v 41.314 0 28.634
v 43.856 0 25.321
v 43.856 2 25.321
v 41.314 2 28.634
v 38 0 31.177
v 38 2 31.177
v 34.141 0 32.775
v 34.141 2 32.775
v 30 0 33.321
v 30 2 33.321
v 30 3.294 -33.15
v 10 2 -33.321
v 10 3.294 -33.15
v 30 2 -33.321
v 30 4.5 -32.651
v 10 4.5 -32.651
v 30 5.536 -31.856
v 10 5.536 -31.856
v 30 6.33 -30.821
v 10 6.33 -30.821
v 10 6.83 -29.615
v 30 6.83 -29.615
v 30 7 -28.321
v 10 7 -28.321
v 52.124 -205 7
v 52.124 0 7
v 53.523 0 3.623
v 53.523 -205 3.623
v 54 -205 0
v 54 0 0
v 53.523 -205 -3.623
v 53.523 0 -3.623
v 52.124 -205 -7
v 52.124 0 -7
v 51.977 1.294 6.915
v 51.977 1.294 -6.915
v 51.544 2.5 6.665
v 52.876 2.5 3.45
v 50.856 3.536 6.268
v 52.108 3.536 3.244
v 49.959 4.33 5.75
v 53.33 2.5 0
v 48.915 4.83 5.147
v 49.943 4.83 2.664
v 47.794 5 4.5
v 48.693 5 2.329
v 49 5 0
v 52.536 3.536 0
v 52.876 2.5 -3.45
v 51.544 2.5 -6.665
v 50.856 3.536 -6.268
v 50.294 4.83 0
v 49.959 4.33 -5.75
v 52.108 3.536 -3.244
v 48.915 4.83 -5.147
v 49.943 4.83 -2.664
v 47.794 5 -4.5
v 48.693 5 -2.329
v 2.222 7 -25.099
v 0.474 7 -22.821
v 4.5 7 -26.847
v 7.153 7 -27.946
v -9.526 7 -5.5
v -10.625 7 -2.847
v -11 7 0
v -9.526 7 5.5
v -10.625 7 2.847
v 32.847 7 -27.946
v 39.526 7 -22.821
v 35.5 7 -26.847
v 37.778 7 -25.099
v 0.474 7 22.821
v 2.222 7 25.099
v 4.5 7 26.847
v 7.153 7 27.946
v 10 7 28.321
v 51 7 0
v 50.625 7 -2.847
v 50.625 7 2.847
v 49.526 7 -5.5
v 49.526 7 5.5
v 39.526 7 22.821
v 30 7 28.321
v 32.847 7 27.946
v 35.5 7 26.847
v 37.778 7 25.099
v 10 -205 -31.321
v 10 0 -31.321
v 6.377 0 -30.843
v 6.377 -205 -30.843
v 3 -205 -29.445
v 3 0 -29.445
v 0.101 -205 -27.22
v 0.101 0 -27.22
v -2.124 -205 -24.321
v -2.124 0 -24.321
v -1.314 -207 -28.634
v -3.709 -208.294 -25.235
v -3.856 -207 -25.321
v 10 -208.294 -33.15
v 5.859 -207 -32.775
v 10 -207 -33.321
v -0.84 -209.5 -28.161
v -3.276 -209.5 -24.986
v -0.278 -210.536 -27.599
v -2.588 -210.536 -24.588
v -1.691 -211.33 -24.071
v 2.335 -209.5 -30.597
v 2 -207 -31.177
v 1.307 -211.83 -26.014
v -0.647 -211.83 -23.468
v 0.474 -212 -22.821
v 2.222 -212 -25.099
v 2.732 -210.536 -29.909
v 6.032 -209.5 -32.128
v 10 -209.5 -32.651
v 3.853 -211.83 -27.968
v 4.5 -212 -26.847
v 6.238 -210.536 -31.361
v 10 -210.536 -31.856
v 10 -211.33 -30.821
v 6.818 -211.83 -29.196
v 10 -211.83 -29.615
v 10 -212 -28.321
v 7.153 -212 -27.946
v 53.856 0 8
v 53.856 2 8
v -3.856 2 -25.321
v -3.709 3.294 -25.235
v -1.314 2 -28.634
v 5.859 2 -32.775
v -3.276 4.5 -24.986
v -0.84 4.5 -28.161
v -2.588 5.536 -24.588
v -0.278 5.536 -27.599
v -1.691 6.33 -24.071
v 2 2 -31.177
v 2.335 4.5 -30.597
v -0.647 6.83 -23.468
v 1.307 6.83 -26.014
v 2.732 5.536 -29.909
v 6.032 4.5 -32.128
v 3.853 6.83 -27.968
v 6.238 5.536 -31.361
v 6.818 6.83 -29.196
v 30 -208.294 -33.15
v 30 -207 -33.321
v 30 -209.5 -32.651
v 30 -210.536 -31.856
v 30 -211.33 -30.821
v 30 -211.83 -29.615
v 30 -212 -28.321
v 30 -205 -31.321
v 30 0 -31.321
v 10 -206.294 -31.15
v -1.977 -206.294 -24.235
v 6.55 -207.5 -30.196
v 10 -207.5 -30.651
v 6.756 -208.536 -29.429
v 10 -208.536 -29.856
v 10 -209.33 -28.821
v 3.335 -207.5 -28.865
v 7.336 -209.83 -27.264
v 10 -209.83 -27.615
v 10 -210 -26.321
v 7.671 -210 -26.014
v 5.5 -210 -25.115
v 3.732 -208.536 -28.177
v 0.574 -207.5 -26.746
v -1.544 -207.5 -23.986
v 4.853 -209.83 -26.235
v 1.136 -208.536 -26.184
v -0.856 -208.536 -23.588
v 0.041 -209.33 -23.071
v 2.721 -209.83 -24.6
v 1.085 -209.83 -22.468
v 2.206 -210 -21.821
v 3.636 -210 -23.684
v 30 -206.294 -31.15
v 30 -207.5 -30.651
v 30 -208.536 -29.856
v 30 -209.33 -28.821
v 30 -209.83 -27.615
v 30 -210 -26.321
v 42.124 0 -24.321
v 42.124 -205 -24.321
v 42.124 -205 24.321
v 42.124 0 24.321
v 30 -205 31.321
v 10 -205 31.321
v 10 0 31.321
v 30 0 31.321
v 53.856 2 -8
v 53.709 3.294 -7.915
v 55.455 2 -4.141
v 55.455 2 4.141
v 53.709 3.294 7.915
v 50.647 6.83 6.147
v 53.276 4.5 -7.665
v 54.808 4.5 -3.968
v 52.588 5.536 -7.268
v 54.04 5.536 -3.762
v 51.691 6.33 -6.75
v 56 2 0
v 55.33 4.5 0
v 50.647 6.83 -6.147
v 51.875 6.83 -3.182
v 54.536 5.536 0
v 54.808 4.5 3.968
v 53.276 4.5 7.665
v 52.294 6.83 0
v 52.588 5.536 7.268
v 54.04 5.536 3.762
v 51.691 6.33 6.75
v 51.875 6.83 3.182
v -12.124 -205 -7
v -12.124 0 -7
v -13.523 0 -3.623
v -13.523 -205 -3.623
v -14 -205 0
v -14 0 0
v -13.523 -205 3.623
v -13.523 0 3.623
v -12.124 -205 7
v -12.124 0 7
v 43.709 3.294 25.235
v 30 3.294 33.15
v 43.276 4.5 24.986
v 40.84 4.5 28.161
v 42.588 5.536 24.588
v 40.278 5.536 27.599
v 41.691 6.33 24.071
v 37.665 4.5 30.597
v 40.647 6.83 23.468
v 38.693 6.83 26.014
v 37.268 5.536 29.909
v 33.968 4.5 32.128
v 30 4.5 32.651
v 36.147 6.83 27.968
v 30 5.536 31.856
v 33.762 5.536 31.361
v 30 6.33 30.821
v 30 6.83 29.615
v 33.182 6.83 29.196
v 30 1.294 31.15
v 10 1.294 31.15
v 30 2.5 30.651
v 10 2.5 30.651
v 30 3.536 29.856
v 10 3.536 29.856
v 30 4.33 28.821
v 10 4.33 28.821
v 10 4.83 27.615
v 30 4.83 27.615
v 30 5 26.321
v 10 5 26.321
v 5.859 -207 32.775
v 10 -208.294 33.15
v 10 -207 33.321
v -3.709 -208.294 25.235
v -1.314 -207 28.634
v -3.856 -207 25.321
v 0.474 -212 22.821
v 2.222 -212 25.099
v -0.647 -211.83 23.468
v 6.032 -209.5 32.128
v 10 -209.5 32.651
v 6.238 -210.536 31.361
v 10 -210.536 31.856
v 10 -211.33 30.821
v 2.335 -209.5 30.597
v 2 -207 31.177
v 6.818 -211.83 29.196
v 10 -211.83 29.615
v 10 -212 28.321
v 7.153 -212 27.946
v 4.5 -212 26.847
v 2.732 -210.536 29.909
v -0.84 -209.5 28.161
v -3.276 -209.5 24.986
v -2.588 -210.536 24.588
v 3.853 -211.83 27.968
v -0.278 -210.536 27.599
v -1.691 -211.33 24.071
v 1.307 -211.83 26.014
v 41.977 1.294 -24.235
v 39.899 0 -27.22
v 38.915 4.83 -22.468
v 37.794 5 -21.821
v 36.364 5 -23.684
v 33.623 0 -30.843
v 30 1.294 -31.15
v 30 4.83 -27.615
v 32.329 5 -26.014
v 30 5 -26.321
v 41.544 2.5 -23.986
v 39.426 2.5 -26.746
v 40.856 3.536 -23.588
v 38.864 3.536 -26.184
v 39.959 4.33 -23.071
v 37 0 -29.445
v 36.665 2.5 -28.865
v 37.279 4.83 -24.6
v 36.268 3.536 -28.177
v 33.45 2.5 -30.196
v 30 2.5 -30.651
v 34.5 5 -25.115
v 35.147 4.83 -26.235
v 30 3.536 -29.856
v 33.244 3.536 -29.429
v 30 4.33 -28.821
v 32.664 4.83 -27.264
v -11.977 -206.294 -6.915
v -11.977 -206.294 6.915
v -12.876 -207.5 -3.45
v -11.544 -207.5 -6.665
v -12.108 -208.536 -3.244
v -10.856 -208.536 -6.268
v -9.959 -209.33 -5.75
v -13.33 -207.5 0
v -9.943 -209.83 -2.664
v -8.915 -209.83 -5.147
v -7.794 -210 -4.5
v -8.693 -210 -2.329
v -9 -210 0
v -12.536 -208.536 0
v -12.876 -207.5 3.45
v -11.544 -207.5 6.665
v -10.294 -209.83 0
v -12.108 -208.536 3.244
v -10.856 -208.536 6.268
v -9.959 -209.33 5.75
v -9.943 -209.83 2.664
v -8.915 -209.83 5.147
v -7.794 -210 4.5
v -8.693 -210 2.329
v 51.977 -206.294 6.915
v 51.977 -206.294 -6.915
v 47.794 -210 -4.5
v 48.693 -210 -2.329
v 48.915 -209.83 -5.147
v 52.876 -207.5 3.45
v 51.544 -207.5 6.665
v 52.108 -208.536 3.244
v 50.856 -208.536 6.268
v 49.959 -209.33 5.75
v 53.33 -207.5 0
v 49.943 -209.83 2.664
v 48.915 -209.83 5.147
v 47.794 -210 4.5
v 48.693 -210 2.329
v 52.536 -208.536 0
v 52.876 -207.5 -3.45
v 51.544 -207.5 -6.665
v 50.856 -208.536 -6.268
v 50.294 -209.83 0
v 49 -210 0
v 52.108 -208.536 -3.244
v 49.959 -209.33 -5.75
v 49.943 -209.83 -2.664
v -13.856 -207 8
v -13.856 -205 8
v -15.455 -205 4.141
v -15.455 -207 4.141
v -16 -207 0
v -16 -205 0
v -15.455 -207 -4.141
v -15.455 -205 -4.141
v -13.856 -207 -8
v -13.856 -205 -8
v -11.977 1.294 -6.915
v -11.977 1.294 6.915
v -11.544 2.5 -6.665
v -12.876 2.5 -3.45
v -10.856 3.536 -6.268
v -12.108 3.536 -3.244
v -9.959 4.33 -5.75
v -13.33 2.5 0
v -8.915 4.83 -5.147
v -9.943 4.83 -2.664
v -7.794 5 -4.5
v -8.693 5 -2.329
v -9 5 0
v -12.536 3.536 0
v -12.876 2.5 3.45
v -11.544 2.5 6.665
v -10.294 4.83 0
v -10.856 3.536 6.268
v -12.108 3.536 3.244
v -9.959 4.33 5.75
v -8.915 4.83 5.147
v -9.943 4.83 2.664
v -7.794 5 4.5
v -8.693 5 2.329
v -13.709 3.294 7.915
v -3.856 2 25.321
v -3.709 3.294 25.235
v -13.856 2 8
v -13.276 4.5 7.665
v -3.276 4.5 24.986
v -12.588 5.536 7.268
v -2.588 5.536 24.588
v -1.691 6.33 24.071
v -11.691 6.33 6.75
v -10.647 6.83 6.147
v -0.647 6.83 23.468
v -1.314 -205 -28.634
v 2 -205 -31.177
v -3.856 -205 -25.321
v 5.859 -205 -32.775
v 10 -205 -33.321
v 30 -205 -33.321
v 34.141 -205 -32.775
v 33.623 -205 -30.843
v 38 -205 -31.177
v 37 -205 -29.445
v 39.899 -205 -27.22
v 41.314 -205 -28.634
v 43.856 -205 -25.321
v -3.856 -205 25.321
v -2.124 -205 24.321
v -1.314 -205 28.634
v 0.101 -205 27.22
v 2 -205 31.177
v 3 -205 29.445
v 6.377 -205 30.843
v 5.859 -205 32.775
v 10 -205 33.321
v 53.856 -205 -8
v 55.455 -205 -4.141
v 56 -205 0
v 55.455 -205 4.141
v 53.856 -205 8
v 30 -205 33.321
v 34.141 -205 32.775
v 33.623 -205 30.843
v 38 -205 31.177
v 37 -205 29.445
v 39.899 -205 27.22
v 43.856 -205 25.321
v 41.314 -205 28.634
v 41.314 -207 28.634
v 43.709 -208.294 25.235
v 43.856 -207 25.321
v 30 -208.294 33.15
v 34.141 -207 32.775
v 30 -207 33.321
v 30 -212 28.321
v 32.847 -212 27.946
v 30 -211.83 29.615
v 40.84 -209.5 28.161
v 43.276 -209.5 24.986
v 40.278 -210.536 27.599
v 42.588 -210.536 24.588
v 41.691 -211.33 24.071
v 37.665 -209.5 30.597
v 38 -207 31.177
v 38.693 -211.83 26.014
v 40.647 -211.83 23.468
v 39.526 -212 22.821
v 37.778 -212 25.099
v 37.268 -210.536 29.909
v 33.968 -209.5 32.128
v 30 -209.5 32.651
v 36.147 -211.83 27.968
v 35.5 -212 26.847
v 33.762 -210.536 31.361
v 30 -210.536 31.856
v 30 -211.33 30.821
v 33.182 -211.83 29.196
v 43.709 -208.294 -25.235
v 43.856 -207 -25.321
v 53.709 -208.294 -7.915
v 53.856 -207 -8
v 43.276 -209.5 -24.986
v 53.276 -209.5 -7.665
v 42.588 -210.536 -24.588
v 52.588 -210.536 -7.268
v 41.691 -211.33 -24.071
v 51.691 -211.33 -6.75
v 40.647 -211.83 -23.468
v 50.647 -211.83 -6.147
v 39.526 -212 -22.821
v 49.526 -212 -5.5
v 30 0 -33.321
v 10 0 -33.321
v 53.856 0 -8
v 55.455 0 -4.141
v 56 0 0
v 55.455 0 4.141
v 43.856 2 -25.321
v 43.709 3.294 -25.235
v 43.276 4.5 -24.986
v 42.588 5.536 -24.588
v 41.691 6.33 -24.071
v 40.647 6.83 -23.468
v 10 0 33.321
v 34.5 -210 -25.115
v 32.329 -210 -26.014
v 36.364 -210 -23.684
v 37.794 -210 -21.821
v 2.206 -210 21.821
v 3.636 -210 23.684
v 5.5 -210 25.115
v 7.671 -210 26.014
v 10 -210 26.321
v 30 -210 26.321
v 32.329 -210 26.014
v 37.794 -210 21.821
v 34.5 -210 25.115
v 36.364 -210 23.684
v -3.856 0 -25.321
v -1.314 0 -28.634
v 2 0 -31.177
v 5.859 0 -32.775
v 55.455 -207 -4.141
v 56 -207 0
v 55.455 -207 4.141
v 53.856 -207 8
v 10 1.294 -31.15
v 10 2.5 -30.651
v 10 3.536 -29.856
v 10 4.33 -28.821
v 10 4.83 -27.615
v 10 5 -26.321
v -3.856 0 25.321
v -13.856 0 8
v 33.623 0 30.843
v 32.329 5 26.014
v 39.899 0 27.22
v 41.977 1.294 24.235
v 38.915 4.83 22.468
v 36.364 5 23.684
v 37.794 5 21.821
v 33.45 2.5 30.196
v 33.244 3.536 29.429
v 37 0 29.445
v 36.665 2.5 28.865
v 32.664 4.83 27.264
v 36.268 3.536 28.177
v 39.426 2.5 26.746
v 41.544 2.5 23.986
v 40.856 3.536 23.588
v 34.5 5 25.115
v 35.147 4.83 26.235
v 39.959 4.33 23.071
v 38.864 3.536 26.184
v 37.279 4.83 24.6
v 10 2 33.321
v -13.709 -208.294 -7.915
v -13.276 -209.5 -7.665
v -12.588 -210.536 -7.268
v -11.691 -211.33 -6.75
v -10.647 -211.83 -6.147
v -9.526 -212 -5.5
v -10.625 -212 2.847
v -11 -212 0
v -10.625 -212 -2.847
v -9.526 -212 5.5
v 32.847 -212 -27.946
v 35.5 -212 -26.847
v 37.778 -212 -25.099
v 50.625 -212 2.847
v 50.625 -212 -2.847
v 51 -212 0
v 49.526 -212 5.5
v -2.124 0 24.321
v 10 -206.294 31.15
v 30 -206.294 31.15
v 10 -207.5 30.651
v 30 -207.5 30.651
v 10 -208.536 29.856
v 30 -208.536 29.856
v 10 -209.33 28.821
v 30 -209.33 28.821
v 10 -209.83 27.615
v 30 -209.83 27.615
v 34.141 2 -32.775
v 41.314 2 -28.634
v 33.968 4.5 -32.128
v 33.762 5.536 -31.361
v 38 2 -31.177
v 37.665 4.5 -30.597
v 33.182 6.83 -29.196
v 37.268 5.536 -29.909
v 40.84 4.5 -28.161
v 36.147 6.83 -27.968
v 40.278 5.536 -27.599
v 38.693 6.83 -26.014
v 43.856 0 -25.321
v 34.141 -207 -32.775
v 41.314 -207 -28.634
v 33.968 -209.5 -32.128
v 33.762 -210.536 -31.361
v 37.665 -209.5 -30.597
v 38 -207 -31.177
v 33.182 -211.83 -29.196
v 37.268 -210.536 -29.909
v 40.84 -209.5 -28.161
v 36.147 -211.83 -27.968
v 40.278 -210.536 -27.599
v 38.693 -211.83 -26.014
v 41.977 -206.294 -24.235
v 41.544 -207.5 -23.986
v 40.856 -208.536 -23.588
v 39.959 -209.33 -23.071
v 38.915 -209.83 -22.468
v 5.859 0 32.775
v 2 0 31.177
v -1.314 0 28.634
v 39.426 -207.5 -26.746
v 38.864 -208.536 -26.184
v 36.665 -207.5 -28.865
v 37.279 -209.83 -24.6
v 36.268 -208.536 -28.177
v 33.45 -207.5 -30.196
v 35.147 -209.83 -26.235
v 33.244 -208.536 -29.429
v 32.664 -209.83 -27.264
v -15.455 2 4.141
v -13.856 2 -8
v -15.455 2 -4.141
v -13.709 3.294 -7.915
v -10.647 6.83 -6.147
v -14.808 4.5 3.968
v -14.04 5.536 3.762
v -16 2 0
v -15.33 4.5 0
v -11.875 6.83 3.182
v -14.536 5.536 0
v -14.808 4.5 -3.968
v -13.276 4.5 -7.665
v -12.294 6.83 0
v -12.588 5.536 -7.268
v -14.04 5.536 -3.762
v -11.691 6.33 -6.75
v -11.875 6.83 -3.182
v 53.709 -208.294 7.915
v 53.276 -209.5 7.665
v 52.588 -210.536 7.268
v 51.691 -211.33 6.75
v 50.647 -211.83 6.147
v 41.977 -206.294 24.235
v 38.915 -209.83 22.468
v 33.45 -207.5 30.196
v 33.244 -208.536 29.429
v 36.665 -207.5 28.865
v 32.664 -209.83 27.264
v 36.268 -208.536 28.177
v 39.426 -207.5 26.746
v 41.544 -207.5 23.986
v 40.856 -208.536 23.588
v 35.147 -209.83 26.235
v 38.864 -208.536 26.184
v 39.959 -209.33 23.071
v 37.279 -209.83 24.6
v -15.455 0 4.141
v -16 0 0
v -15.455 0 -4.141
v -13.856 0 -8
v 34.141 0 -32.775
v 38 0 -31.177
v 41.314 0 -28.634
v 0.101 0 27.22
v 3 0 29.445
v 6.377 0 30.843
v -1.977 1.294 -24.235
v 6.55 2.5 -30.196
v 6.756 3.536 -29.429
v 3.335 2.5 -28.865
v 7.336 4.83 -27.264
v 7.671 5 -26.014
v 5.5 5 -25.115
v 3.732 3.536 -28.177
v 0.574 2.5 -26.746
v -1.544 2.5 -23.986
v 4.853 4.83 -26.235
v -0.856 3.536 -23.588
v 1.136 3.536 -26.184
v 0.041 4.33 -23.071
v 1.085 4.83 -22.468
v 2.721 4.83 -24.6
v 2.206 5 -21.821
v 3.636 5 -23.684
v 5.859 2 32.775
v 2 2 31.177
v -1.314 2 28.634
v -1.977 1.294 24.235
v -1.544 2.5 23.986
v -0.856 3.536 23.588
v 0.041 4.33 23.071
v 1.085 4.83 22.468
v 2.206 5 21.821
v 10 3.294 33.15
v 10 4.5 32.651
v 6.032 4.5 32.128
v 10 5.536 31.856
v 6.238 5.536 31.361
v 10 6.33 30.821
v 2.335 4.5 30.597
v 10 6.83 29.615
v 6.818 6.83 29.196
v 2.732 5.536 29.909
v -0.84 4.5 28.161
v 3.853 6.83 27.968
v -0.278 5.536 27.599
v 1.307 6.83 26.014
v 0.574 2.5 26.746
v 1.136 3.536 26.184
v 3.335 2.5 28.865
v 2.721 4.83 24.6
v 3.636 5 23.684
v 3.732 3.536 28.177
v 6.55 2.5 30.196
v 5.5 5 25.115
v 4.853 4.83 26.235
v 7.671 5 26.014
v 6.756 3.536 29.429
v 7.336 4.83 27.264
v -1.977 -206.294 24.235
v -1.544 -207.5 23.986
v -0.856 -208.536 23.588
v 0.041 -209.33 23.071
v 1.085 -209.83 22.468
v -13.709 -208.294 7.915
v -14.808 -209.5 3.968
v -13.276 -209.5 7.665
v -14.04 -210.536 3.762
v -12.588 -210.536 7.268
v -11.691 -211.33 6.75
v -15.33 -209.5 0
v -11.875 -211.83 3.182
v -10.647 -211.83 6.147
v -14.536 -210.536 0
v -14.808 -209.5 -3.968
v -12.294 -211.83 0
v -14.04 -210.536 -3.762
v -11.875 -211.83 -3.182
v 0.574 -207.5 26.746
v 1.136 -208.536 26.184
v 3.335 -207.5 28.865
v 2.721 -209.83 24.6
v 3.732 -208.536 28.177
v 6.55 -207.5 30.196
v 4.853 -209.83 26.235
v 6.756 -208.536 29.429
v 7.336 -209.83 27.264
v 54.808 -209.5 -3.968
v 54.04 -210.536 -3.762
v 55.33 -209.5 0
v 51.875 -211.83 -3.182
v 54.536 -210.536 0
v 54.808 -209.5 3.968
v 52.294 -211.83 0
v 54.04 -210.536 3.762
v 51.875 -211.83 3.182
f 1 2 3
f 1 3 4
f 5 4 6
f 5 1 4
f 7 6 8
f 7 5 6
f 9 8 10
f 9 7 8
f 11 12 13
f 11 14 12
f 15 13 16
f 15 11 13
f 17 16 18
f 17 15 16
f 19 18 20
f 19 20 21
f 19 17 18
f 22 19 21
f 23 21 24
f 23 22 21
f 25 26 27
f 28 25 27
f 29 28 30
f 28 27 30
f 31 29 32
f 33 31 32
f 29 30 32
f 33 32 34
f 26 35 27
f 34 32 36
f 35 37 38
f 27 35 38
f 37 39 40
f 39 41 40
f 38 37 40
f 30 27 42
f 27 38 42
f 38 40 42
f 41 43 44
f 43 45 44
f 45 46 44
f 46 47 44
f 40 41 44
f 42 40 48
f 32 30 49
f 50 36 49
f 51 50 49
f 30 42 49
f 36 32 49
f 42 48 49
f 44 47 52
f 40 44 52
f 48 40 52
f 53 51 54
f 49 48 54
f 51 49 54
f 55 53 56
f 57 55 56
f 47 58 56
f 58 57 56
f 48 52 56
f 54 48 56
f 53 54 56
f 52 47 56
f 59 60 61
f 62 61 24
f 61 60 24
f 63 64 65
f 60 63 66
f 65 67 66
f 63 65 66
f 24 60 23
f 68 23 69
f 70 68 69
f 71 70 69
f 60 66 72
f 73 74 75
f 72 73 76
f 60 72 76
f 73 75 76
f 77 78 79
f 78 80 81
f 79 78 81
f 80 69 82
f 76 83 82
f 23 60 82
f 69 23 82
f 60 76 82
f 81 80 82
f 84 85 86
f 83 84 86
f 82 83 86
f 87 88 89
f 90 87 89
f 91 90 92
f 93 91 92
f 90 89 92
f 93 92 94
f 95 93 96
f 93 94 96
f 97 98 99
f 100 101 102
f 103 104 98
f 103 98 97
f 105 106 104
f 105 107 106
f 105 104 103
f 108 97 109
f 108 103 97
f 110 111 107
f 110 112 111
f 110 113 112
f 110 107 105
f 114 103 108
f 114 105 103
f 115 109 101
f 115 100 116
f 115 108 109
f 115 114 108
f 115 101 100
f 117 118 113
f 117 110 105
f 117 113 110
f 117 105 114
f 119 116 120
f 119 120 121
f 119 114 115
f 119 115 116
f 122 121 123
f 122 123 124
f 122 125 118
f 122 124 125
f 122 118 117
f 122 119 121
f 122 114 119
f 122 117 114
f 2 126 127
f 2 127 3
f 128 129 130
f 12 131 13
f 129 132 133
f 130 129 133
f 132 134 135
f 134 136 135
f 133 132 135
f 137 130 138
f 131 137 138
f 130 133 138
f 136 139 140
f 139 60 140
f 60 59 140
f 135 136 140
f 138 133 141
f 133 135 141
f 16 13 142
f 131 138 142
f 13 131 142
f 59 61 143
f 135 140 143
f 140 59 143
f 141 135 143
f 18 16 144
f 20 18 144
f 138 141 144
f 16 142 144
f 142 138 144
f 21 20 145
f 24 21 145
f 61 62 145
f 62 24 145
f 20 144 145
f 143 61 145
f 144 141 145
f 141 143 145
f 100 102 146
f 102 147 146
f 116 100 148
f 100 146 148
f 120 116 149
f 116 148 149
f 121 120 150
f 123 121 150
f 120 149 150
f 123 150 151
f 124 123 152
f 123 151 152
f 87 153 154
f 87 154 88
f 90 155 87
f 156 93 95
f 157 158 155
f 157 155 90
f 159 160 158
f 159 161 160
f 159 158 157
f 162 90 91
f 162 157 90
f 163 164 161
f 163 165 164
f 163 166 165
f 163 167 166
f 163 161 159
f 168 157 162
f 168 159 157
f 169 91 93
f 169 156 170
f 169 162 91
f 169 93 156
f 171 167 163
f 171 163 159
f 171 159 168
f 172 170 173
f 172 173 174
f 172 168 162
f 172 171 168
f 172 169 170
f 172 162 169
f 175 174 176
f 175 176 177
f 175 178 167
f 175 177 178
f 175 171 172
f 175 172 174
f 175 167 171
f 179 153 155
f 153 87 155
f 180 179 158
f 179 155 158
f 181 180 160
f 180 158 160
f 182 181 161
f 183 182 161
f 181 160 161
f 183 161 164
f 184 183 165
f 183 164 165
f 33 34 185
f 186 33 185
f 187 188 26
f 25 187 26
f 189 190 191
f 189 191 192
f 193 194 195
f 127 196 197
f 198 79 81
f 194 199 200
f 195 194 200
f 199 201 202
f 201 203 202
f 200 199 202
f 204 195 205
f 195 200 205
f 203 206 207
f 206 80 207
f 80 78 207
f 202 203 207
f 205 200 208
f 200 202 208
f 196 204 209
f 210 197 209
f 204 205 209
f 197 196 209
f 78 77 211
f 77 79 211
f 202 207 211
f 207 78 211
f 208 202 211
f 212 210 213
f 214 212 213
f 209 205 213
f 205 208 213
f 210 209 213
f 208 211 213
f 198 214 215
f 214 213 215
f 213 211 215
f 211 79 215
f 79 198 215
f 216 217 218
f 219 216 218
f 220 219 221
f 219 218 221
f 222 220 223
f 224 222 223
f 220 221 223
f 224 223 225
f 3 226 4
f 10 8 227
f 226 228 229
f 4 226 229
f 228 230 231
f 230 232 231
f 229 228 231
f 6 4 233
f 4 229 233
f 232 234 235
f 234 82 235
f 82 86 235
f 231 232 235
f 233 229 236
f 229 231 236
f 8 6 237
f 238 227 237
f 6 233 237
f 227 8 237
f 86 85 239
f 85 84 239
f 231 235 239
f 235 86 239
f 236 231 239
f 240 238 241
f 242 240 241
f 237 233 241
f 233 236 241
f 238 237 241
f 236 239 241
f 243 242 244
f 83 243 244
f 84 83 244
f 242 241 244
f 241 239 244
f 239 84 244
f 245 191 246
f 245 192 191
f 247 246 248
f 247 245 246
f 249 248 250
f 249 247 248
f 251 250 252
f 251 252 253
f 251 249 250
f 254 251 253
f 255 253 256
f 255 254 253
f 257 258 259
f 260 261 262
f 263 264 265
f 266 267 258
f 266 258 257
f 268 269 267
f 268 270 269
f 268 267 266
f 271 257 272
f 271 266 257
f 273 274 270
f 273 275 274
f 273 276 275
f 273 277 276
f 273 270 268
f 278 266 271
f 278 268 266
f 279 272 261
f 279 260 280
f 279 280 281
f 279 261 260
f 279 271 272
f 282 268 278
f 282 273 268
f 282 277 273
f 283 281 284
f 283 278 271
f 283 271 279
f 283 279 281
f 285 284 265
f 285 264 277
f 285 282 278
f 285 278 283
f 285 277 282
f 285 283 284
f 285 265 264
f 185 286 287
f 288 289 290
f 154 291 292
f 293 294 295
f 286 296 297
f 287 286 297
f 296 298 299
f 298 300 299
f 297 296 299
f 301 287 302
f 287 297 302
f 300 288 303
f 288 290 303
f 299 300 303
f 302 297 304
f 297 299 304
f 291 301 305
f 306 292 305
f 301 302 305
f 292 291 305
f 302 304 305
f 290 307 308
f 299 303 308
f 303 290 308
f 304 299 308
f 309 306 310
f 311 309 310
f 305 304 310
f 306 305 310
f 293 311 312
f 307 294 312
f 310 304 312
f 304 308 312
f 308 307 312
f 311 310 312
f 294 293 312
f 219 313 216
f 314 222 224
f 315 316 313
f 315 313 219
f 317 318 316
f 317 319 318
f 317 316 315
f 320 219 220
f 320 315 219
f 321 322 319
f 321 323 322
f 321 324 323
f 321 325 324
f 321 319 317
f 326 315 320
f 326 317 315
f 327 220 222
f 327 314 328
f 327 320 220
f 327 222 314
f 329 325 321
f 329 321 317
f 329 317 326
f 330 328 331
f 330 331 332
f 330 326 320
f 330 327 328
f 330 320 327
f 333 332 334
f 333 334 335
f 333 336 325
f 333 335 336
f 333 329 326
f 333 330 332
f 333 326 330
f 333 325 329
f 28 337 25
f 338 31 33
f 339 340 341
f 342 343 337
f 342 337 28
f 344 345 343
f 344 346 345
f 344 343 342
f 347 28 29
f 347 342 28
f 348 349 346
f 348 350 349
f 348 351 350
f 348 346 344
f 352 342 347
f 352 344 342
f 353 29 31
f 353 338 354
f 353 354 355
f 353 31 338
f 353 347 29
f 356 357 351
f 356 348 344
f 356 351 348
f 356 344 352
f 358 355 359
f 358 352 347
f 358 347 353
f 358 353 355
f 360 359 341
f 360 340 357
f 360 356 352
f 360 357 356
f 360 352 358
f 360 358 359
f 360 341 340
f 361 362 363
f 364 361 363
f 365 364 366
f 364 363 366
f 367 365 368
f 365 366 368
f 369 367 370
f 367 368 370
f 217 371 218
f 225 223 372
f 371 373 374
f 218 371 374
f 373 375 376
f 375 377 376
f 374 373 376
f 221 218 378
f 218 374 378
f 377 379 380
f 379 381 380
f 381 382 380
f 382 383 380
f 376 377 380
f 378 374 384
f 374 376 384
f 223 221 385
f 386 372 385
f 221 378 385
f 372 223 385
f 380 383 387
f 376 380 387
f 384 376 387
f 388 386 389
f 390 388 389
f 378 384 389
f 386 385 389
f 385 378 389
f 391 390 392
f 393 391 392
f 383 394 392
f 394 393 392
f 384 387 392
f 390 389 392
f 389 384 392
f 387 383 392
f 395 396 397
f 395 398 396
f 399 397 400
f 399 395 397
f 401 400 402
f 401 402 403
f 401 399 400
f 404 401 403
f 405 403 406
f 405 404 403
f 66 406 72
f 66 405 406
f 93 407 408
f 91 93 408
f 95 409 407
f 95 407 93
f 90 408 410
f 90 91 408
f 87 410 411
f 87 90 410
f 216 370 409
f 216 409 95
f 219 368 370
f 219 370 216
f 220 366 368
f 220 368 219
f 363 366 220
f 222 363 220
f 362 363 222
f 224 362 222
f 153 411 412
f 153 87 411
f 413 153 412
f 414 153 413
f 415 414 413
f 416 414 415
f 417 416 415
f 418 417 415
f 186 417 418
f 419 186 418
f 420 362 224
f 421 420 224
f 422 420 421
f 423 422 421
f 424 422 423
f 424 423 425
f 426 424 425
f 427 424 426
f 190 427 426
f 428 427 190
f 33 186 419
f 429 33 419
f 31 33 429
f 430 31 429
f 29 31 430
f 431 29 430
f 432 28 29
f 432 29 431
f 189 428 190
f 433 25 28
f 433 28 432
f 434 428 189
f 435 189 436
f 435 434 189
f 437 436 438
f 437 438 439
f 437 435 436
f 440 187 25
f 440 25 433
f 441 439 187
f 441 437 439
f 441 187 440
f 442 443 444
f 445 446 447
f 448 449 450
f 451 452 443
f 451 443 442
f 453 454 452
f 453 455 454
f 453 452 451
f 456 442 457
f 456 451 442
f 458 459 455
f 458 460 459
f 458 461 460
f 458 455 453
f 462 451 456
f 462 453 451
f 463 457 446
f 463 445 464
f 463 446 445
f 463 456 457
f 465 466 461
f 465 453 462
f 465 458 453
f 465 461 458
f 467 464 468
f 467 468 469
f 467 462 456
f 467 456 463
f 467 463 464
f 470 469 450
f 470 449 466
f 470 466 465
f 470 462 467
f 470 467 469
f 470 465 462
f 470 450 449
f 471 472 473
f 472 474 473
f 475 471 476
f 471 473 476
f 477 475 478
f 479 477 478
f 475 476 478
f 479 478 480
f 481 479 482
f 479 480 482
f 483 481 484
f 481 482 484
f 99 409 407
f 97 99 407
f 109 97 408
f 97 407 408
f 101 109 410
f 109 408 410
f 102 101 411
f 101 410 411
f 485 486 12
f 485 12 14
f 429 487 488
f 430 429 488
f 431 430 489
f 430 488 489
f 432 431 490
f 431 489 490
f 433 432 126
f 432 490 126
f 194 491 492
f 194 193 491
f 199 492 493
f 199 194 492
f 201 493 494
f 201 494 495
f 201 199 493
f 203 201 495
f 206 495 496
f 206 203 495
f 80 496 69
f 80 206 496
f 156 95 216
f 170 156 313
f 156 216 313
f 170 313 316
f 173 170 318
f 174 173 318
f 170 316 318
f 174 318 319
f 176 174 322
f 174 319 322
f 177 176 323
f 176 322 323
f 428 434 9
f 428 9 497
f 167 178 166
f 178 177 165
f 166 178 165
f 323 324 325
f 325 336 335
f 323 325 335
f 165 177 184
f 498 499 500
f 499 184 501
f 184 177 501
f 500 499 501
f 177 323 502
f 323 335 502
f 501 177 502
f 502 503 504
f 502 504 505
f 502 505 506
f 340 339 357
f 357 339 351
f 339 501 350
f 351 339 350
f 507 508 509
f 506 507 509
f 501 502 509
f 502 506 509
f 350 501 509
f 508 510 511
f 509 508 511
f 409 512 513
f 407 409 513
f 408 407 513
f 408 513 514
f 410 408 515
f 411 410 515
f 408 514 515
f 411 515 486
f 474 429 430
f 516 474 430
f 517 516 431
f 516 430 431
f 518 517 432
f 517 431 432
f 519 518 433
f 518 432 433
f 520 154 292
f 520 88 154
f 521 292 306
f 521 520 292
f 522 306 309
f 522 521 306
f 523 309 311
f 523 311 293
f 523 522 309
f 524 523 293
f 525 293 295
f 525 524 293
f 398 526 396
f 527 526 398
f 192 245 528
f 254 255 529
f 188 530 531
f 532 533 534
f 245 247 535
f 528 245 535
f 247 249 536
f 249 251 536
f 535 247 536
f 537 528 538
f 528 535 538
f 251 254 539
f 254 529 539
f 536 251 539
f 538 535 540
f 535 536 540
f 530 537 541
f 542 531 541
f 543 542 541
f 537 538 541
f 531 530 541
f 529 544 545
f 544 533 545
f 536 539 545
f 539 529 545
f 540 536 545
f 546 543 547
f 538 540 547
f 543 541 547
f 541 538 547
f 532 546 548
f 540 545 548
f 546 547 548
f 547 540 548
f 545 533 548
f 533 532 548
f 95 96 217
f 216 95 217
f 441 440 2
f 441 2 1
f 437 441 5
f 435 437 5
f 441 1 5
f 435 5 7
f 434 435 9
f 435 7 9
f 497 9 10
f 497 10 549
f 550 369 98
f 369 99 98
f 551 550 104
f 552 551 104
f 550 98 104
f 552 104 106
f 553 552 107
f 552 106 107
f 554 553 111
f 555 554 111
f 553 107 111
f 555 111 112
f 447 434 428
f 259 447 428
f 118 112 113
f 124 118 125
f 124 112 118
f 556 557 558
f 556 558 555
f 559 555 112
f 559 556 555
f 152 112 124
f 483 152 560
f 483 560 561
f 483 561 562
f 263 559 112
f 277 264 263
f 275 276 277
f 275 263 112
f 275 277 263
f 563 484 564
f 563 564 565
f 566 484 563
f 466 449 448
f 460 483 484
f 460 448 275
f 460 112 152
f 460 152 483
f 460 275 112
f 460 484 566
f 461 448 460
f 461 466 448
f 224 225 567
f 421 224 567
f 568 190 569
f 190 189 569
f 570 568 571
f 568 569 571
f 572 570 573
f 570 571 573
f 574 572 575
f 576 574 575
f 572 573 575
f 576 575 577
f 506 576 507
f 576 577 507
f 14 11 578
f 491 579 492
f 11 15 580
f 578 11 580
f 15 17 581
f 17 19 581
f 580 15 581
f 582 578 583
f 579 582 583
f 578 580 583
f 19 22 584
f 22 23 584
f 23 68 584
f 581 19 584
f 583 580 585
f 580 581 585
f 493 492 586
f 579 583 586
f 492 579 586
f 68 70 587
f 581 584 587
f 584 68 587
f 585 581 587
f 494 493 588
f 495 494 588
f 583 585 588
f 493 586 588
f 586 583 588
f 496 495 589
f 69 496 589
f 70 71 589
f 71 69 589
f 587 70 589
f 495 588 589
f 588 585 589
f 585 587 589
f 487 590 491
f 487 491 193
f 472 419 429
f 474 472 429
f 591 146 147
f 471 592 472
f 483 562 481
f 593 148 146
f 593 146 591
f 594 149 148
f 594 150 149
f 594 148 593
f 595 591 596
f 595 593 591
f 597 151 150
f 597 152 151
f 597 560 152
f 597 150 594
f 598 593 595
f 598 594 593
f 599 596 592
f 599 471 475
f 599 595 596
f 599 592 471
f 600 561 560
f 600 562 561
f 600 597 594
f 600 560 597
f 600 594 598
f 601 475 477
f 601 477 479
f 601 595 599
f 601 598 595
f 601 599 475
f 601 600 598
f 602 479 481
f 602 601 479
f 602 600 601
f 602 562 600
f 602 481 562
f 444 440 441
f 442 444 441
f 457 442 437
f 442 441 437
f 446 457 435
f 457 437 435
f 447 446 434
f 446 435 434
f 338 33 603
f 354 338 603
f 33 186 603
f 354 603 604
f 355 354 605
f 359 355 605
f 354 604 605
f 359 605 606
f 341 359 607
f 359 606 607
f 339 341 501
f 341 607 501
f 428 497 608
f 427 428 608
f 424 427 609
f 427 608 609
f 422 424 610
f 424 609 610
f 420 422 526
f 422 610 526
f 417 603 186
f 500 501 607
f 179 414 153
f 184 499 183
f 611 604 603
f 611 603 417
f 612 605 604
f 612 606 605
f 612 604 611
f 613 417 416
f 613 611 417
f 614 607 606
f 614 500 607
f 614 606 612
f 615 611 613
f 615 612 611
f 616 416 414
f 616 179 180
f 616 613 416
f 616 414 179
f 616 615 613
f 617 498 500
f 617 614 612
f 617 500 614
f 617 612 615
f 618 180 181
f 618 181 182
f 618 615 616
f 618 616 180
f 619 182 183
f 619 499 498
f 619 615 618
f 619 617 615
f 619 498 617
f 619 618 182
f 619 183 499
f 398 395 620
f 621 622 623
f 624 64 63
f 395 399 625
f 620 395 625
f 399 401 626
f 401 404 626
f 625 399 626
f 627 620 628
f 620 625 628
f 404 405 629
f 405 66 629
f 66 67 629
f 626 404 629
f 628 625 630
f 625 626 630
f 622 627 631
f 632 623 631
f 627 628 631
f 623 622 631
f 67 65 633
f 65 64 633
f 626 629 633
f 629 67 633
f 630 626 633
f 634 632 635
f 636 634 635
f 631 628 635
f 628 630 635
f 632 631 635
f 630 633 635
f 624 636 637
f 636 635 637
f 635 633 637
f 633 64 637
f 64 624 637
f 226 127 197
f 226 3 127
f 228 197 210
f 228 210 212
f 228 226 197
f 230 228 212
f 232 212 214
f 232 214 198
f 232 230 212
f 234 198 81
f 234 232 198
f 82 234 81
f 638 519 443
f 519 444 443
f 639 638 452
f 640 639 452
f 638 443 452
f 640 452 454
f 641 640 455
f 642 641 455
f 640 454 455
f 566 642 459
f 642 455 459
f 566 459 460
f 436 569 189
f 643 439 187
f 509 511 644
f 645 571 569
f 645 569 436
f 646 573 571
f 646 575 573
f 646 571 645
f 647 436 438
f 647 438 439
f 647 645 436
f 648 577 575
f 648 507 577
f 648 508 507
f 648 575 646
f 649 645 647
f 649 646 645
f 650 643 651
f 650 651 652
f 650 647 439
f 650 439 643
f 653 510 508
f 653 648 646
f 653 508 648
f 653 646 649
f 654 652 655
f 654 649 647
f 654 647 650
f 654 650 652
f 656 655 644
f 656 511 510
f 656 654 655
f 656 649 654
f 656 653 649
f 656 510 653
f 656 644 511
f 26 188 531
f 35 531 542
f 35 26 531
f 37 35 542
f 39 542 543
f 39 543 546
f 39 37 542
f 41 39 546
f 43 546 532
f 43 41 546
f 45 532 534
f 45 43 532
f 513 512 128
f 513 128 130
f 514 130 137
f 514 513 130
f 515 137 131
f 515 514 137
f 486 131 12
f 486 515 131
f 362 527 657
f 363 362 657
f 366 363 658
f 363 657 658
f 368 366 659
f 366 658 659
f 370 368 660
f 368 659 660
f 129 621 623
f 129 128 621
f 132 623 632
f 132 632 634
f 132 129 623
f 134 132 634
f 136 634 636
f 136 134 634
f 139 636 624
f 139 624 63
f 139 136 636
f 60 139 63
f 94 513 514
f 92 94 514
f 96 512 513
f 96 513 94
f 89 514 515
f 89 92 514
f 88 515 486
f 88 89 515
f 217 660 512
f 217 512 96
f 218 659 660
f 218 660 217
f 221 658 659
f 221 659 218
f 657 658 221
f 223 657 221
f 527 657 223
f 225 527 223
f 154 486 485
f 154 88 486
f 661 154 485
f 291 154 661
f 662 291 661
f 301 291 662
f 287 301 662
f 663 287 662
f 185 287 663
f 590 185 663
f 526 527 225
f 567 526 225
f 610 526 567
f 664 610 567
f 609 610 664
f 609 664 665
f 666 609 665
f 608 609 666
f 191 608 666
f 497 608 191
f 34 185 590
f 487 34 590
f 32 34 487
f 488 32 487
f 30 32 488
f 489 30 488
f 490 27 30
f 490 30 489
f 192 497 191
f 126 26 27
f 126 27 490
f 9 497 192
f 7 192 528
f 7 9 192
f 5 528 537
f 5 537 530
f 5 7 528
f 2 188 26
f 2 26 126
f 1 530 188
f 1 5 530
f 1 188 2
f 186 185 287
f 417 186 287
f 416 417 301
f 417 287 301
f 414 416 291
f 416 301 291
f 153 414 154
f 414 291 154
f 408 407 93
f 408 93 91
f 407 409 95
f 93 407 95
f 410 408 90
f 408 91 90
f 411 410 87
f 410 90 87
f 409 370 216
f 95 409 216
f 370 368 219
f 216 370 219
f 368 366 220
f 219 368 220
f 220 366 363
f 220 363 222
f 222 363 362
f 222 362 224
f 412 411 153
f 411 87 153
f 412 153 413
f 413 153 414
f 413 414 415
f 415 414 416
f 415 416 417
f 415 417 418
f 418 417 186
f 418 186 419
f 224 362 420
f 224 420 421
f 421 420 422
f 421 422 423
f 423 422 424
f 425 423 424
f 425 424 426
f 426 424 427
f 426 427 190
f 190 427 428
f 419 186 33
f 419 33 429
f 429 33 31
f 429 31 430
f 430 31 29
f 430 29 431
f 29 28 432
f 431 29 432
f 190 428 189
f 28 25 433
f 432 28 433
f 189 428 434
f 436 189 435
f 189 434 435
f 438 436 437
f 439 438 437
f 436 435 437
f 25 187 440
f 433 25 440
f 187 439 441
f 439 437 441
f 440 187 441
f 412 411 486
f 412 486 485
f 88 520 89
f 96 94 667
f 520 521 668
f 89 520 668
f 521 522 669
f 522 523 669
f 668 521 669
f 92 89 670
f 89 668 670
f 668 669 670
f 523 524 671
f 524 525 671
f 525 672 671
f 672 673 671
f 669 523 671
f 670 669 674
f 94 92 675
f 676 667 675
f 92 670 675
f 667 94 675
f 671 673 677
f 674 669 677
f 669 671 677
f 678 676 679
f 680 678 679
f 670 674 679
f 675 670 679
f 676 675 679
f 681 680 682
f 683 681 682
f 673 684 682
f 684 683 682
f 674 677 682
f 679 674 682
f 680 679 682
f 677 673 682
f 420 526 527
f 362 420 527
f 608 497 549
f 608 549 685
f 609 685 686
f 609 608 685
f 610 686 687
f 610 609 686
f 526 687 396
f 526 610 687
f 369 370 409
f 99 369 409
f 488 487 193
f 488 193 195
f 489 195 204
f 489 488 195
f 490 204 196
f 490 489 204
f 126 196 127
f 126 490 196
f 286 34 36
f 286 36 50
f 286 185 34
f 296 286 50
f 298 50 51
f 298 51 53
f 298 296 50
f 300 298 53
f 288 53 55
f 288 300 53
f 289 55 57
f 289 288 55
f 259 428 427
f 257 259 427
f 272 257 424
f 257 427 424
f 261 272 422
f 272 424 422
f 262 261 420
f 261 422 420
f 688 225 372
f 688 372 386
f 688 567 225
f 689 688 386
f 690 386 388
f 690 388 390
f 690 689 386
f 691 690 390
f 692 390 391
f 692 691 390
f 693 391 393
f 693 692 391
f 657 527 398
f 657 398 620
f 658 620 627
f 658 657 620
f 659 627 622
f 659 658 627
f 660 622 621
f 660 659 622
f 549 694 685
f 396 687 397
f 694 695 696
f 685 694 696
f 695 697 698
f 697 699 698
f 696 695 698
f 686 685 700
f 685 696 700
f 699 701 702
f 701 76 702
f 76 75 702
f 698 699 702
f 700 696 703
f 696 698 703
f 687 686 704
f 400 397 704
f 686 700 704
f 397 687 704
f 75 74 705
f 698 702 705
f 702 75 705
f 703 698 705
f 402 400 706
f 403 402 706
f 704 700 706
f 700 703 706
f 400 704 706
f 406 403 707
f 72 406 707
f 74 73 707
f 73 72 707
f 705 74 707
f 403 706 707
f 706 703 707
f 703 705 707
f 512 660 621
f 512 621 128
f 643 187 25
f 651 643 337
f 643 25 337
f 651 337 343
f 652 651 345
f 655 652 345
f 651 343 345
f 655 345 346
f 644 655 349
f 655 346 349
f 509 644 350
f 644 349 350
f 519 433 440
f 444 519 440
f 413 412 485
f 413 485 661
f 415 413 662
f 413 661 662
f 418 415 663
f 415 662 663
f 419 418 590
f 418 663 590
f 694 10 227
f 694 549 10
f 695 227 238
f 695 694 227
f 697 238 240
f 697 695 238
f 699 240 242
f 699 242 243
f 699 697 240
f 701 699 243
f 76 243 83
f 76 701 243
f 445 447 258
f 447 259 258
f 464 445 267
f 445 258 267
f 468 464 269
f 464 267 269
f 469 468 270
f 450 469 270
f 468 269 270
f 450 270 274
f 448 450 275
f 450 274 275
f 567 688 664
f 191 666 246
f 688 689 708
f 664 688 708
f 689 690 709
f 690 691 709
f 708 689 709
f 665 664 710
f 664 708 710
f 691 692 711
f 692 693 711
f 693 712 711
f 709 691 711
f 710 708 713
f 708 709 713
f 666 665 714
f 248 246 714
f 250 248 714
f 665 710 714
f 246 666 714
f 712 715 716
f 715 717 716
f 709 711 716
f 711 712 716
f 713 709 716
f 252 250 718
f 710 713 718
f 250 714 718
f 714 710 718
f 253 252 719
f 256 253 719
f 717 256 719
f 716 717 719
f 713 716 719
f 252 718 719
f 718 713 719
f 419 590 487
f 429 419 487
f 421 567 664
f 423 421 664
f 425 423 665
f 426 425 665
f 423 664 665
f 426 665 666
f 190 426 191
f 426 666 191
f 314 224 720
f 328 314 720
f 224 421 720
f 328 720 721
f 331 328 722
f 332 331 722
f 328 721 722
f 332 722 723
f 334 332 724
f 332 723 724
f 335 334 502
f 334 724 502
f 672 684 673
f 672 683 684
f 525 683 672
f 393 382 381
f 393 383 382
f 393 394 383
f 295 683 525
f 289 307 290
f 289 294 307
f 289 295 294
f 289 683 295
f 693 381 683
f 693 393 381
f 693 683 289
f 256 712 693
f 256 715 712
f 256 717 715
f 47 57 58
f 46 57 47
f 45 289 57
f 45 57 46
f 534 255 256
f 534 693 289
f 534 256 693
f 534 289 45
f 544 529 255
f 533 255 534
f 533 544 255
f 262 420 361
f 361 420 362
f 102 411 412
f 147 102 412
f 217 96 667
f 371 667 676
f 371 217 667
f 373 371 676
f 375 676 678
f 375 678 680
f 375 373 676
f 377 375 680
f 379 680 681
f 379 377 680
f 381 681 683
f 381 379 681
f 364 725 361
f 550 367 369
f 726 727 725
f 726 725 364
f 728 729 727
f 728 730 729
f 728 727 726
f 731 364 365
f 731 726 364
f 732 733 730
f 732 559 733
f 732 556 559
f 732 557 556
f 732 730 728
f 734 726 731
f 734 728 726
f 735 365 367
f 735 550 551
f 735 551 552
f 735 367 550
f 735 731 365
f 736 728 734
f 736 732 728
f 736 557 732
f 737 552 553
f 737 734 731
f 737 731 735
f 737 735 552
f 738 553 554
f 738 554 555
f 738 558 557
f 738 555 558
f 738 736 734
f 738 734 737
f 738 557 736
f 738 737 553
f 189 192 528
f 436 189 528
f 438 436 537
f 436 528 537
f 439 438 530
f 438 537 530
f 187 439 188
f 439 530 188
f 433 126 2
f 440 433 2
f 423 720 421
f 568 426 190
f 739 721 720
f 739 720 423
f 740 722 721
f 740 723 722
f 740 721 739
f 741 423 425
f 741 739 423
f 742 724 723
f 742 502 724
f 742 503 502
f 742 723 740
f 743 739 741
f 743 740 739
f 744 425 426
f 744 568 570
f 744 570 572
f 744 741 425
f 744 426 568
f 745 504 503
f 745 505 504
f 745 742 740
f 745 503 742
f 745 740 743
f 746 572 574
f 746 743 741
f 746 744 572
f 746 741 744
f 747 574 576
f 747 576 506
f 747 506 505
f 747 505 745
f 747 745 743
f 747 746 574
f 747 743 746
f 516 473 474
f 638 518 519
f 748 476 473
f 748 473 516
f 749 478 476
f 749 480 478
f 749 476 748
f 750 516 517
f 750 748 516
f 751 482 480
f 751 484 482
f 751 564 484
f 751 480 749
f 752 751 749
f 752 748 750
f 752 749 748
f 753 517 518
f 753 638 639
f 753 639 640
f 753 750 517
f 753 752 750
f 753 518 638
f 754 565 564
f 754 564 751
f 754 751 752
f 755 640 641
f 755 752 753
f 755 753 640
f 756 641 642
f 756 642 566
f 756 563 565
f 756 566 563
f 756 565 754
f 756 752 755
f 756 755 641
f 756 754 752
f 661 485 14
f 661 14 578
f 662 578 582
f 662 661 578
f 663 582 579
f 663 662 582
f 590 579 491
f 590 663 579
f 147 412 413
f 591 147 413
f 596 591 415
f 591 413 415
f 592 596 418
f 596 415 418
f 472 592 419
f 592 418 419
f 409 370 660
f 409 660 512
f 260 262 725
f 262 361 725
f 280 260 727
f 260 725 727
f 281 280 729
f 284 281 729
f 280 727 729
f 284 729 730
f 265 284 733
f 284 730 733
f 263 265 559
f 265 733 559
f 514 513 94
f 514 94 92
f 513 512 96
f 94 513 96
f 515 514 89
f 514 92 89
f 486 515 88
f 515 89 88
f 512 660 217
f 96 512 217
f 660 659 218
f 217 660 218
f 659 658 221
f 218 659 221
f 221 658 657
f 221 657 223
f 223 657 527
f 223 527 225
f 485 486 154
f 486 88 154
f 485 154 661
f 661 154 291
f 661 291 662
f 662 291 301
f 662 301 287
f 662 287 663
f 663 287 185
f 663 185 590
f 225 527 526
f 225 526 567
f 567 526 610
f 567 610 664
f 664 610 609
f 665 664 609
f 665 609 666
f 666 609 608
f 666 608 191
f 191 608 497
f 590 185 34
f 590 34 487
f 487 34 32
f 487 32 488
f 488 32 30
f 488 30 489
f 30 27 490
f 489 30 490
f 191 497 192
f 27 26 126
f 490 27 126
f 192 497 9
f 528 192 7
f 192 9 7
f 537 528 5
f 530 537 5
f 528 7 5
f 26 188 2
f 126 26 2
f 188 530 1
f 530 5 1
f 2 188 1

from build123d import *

# Parameters (mm, degrees)
F2_DEPTH = 205
F4_DEPTH = 5
F6_DEPTH = 2
F7_R     = 5
F8_R     = 4.99999


# Not quite as in the source:
# - a fillet or chamfer is up to 0.001 mm smaller than in the source, because OpenCascade refuses the exact size


with BuildPart() as f2:
    # F1 (on Front) → F2 (new body)
    with BuildSketch(Plane.XZ):
        with BuildLine():
            Line((30, 33.3205085668), (10, 33.3205085668))
            ThreePointArc((10, 33.3205085668), (1.9999997545, 31.1769149615), (-3.8564068859, 25.3205083212))
            Line((-3.8564068859, 25.3205083212), (-13.8564068859, 8.0000002455))
            ThreePointArc((-13.8564068859, 8.0000002455), (-16.0000004911, 0), (-13.8564068859, -8.0000002455))
            Line((-13.8564068859, -8.0000002455), (-3.8564068859, -25.3205083212))
            ThreePointArc((-3.8564068859, -25.3205083212), (1.9999997545, -31.1769149615), (10, -33.3205085668))
            Line((10, -33.3205085668), (30, -33.3205085668))
            ThreePointArc((30, -33.3205085668), (38.0000002455, -31.1769149615), (43.8564068859, -25.3205083212))
            Line((43.8564068859, -25.3205083212), (53.8564068859, -8.0000002455))
            ThreePointArc((53.8564068859, -8.0000002455), (56.0000004911, 0), (53.8564068859, 8.0000002455))
            Line((53.8564068859, 8.0000002455), (43.8564068859, 25.3205083212))
            ThreePointArc((43.8564068859, 25.3205083212), (38.0000002455, 31.1769149615), (30, 33.3205085668))
        make_face()
        with BuildLine():
            ThreePointArc((-2.1243560783, 24.3205083212), (2.9999997545, 29.444864154), (10, 31.3205085668))
            Line((10, 31.3205085668), (30, 31.3205085668))
            ThreePointArc((30, 31.3205085668), (37.0000002455, 29.444864154), (42.1243560783, 24.3205083212))
            Line((42.1243560783, 24.3205083212), (52.1243560783, 7.0000002455))
            ThreePointArc((52.1243560783, 7.0000002455), (54.0000004911, 0), (52.1243560783, -7.0000002455))
            Line((52.1243560783, -7.0000002455), (42.1243560783, -24.3205083212))
            ThreePointArc((42.1243560783, -24.3205083212), (37.0000002455, -29.444864154), (30, -31.3205085668))
            Line((30, -31.3205085668), (10, -31.3205085668))
            ThreePointArc((10, -31.3205085668), (2.9999997545, -29.444864154), (-2.1243560783, -24.3205083212))
            Line((-2.1243560783, -24.3205083212), (-12.1243560783, -7.0000002455))
            ThreePointArc((-12.1243560783, -7.0000002455), (-14.0000004911, 0), (-12.1243560783, 7.0000002455))
            Line((-12.1243560783, 7.0000002455), (-2.1243560783, 24.3205083212))
        make_face(mode=Mode.SUBTRACT)
    extrude(amount=F2_DEPTH)


with BuildPart() as f4:
    # F3 (on face) → F4 (new body)
    with BuildSketch(Plane.XZ.offset(205)):
        with BuildLine():
            ThreePointArc((-3.8564068859, -25.3205083212), (1.9999997545, -31.1769149615), (10, -33.3205085668))
            Line((10, -33.3205085668), (30, -33.3205085668))
            ThreePointArc((30, -33.3205085668), (38.0000002455, -31.1769149615), (43.8564068859, -25.3205083212))
            Line((43.8564068859, -25.3205083212), (53.8564068859, -8.0000002455))
            ThreePointArc((53.8564068859, -8.0000002455), (56.0000004911, 0), (53.8564068859, 8.0000002455))
            Line((53.8564068859, 8.0000002455), (43.8564068859, 25.3205083212))
            ThreePointArc((43.8564068859, 25.3205083212), (38.0000002455, 31.1769149615), (30, 33.3205085668))
            Line((30, 33.3205085668), (10, 33.3205085668))
            ThreePointArc((10, 33.3205085668), (1.9999997545, 31.1769149615), (-3.8564068859, 25.3205083212))
            Line((-3.8564068859, 25.3205083212), (-13.8564068859, 8.0000002455))
            ThreePointArc((-13.8564068859, 8.0000002455), (-16.0000004911, 0), (-13.8564068859, -8.0000002455))
            Line((-13.8564068859, -8.0000002455), (-3.8564068859, -25.3205083212))
        make_face()
        with BuildLine():
            ThreePointArc((-2.1243560783, 24.3205083212), (2.9999997545, 29.444864154), (10, 31.3205085668))
            Line((10, 31.3205085668), (30, 31.3205085668))
            ThreePointArc((30, 31.3205085668), (37.0000002455, 29.444864154), (42.1243560783, 24.3205083212))
            Line((42.1243560783, 24.3205083212), (52.1243560783, 7.0000002455))
            ThreePointArc((52.1243560783, 7.0000002455), (54.0000004911, 0), (52.1243560783, -7.0000002455))
            Line((52.1243560783, -7.0000002455), (42.1243560783, -24.3205083212))
            ThreePointArc((42.1243560783, -24.3205083212), (37.0000002455, -29.444864154), (30, -31.3205085668))
            Line((30, -31.3205085668), (10, -31.3205085668))
            ThreePointArc((10, -31.3205085668), (2.9999997545, -29.444864154), (-2.1243560783, -24.3205083212))
            Line((-2.1243560783, -24.3205083212), (-12.1243560783, -7.0000002455))
            ThreePointArc((-12.1243560783, -7.0000002455), (-14.0000004911, 0), (-12.1243560783, 7.0000002455))
            Line((-12.1243560783, 7.0000002455), (-2.1243560783, 24.3205083212))
        make_face(mode=Mode.SUBTRACT)
    extrude(amount=F4_DEPTH)

    # F5 (on face) → F6 (join)
    with BuildSketch(Plane.XZ.offset(210)):
        with BuildLine():
            Line((-13.8564068859, -8.0000002455), (-3.8564068859, -25.3205083212))
            ThreePointArc((-3.8564068859, -25.3205083212), (1.9999997545, -31.1769149615), (10, -33.3205085668))
            Line((10, -33.3205085668), (30, -33.3205085668))
            ThreePointArc((30, -33.3205085668), (38.0000002455, -31.1769149615), (43.8564068859, -25.3205083212))
            Line((43.8564068859, -25.3205083212), (53.8564068859, -8.0000002455))
            ThreePointArc((53.8564068859, -8.0000002455), (56.0000004911, 0), (53.8564068859, 8.0000002455))
            Line((53.8564068859, 8.0000002455), (43.8564068859, 25.3205083212))
            ThreePointArc((43.8564068859, 25.3205083212), (38.0000002455, 31.1769149615), (30, 33.3205085668))
            Line((30, 33.3205085668), (10, 33.3205085668))
            ThreePointArc((10, 33.3205085668), (1.9999997545, 31.1769149615), (-3.8564068859, 25.3205083212))
            Line((-3.8564068859, 25.3205083212), (-13.8564068859, 8.0000002455))
            ThreePointArc((-13.8564068859, 8.0000002455), (-16.0000004911, 0), (-13.8564068859, -8.0000002455))
        make_face()
        with BuildLine():
            ThreePointArc((10, -31.3205085668), (2.9999997545, -29.444864154), (-2.1243560783, -24.3205083212))
            Line((-2.1243560783, -24.3205083212), (-12.1243560783, -7.0000002455))
            ThreePointArc((-12.1243560783, -7.0000002455), (-14.0000004911, 0), (-12.1243560783, 7.0000002455))
            Line((-12.1243560783, 7.0000002455), (-2.1243560783, 24.3205083212))
            ThreePointArc((-2.1243560783, 24.3205083212), (2.9999997545, 29.444864154), (10, 31.3205085668))
            Line((10, 31.3205085668), (30, 31.3205085668))
            ThreePointArc((30, 31.3205085668), (37.0000002455, 29.444864154), (42.1243560783, 24.3205083212))
            Line((42.1243560783, 24.3205083212), (52.1243560783, 7.0000002455))
            ThreePointArc((52.1243560783, 7.0000002455), (54.0000004911, 0), (52.1243560783, -7.0000002455))
            Line((52.1243560783, -7.0000002455), (42.1243560783, -24.3205083212))
            ThreePointArc((42.1243560783, -24.3205083212), (37.0000002455, -29.444864154), (30, -31.3205085668))
            Line((30, -31.3205085668), (10, -31.3205085668))
        make_face(mode=Mode.SUBTRACT)
        with BuildLine():
            Line((-12.1243560783, -7.0000002455), (-2.1243560783, -24.3205083212))
            ThreePointArc((-2.1243560783, -24.3205083212), (2.9999997545, -29.444864154), (10, -31.3205085668))
            Line((10, -31.3205085668), (30, -31.3205085668))
            ThreePointArc((30, -31.3205085668), (37.0000002455, -29.444864154), (42.1243560783, -24.3205083212))
            Line((42.1243560783, -24.3205083212), (52.1243560783, -7.0000002455))
            ThreePointArc((52.1243560783, -7.0000002455), (54.0000004911, 0), (52.1243560783, 7.0000002455))
            Line((52.1243560783, 7.0000002455), (42.1243560783, 24.3205083212))
            ThreePointArc((42.1243560783, 24.3205083212), (37.0000002455, 29.444864154), (30, 31.3205085668))
            Line((30, 31.3205085668), (10, 31.3205085668))
            ThreePointArc((10, 31.3205085668), (2.9999997545, 29.444864154), (-2.1243560783, 24.3205083212))
            Line((-2.1243560783, 24.3205083212), (-12.1243560783, 7.0000002455))
            ThreePointArc((-12.1243560783, 7.0000002455), (-14.0000004911, 0), (-12.1243560783, -7.0000002455))
        make_face()
    extrude(amount=F6_DEPTH)

    # F7
    f7_edges = [f4.edges().sort_by_distance(p)[0] for p in [
        (-8.856407, -212, -16.660254),
        (2, -212, -31.176915),
        (20, -212, -33.320509),
        (38, -212, -31.176915),
        (48.856407, -212, -16.660254),
        (56, -212, 0),
        (48.856407, -212, 16.660254),
        (38, -212, 31.176915),
        (20, -212, 33.320509),
        (2, -212, 31.176915),
        (-8.856407, -212, 16.660254),
        (-16, -212, 0),
    ]]
    fillet(f7_edges, radius=F7_R)

    # F8 (radius 5 in the source; OpenCascade refuses exactly that, so slightly less here)
    f8_edges = [f4.edges().sort_by_distance(p)[0] for p in [
        (-7.124356, -210, -15.660254),
        (-14, -210, 0),
        (-7.124356, -210, 15.660254),
        (3, -210, 29.444864),
        (20, -210, 31.320509),
        (37, -210, 29.444864),
        (47.124356, -210, 15.660254),
        (54, -210, 0),
        (47.124356, -210, -15.660254),
        (37, -210, -29.444864),
        (20, -210, -31.320509),
        (3, -210, -29.444864),
    ]]
    fillet(f8_edges, radius=F8_R)


with BuildPart() as f10_1:
    # F10: instance of F4
    add(f4.part.mirror(Plane.XZ.offset(102.5)))


solid = Compound([f2.part, f4.part, f10_1.part])
